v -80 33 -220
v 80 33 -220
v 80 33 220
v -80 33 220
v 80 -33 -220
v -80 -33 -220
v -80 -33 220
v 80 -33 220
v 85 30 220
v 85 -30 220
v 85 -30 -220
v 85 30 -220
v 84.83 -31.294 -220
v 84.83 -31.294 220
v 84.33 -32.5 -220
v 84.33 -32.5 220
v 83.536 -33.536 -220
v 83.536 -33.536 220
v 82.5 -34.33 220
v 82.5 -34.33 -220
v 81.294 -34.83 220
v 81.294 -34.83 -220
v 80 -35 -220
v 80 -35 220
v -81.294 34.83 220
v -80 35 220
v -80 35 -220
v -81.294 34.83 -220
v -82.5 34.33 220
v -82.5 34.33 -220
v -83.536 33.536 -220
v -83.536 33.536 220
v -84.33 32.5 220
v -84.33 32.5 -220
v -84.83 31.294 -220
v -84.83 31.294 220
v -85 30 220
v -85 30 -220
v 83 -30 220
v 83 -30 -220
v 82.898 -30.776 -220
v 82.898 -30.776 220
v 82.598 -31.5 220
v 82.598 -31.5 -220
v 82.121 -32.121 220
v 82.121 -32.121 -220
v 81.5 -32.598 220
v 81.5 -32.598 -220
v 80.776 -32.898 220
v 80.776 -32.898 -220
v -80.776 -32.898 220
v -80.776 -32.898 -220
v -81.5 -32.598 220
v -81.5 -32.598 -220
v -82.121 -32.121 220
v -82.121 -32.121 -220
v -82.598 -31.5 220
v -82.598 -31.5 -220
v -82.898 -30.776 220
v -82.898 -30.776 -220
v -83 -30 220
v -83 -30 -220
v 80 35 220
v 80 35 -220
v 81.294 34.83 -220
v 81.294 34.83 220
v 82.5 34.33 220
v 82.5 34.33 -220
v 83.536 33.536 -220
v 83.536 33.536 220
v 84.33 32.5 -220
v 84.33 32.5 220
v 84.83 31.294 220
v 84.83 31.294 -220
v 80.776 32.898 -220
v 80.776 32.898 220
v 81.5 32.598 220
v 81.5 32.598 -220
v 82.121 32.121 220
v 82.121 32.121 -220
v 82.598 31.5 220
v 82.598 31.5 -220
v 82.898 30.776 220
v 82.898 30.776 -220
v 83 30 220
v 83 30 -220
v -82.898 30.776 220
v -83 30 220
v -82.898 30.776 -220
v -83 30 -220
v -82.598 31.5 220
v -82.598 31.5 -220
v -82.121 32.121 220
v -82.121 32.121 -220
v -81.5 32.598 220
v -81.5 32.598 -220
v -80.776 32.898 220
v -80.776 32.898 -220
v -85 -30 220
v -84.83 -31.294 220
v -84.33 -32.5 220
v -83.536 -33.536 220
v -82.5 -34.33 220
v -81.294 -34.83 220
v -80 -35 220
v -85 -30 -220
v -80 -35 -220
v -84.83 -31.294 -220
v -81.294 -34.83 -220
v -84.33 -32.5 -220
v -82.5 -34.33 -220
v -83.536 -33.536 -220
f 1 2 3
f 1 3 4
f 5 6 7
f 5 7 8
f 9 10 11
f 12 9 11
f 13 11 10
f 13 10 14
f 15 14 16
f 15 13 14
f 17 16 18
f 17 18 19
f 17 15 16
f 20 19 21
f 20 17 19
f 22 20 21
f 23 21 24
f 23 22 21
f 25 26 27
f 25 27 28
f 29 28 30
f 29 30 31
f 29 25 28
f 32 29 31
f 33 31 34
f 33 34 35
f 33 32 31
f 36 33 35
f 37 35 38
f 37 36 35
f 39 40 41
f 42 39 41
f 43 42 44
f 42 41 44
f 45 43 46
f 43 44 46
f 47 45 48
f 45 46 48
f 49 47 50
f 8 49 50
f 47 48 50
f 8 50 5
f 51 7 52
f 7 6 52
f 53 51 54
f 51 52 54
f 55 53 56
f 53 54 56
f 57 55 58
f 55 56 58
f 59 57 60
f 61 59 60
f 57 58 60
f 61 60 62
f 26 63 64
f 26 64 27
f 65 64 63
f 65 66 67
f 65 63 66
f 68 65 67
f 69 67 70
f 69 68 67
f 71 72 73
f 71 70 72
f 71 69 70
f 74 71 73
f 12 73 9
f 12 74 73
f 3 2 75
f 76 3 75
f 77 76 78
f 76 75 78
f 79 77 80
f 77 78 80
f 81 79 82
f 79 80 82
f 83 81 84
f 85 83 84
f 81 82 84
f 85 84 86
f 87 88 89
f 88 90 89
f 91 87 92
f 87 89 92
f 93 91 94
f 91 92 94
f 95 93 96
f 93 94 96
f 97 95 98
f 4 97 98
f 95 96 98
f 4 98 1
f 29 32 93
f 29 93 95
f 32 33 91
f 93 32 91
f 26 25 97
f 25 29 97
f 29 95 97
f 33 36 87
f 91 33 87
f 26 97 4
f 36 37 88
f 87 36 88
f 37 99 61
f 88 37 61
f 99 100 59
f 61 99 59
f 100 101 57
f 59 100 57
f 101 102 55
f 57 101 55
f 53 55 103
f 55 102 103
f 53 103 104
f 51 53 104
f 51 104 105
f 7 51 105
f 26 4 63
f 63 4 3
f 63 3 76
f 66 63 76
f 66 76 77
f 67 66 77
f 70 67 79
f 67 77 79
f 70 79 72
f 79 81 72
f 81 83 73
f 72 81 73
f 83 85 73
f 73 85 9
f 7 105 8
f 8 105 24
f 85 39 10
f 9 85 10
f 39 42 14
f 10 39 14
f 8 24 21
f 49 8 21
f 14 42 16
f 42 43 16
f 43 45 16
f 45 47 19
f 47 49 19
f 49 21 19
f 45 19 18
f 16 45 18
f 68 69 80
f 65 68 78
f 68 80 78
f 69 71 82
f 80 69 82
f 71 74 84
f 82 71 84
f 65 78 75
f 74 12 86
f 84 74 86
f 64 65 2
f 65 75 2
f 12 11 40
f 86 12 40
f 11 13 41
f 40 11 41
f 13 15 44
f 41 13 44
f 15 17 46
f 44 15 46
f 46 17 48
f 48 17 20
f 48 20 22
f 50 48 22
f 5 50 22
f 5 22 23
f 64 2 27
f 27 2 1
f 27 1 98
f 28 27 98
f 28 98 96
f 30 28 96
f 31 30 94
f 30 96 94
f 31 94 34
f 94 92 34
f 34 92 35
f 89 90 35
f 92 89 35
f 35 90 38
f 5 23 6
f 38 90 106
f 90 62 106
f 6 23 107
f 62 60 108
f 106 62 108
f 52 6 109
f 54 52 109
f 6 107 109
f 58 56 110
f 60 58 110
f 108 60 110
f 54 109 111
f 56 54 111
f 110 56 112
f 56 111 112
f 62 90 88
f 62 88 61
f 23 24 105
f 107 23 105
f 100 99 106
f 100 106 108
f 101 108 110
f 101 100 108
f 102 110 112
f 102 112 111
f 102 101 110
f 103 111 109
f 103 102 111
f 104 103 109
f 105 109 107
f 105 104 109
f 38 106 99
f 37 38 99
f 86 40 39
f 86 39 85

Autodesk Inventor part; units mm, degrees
ref_plane "YZ Plane" through (0, 0, 0) normal (1, 0, 0) x (0, 1, 0)
ref_plane "XZ Plane" through (0, 0, 0) normal (0, 1, 0) x (-1, 0, 0)
ref_plane "XY Plane" through (0, 0, 0) normal (0, 0, 1) x (1, 0, 0)
sketch "Esquisse1" plane through (0, 0, 0) normal (0, 1, 0) x (-1, 0, 0)
  line L0 (0, -308) -> (0, 308) construction
  line L1 (-119, 0) -> (119, 0) construction
  line L2 (-85, -220) -> (85, -220)
  line L3 (85, -220) -> (85, 220)
  line L4 (85, 220) -> (-85, 220)
  line L5 (-85, 220) -> (-85, -220)
  line L6 (-85, -220) -> (85, 220) construction
  line L7 (85, -220) -> (-85, 220) construction
  point P0 (0, 0)
  dimension "d0" = 170
  dimension "d1" = 440
extrude "Extrusion1" add sketch "Esquisse1" along normal mid plane 70
fillet "Congé1" radius 5 4 edges at (85, -35, 0) (85, 35, 0) (-85, -35, 0) (-85, 35, 0)
sketch "Sketch2" plane through (80, 35, -220) normal (0, 0, -1) x (-1, 0, 0)
  arc A0 (165, -5) -> (160, 0) centre (160, -5) ccw construction
  line L0 (0, 0) -> (160, 0) construction
  arc A1 (0, 0) -> (-5, -5) centre (0, -5) ccw construction
  line L1 (-5, -5) -> (-5, -65) construction
  arc A2 (-5, -65) -> (0, -70) centre (0, -65) ccw construction
  line L2 (160, -70) -> (0, -70) construction
  arc A3 (160, -70) -> (165, -65) centre (160, -65) ccw construction
  line L3 (165, -65) -> (165, -5) construction
  arc A4 (-3, -65) -> (0, -68) centre (0, -65) ccw
  line L4 (-3, -65) -> (-3, -5)
  arc A5 (0, -2) -> (-3, -5) centre (0, -5) ccw
  line L5 (0, -2) -> (160, -2)
  arc A6 (163, -5) -> (160, -2) centre (160, -5) ccw
  line L6 (163, -5) -> (163, -65)
  arc A7 (160, -68) -> (163, -65) centre (160, -65) ccw
  line L7 (160, -68) -> (0, -68)
  point P0 (80, -35)
  dimension "d5" = 2
extrude "Extrusion2" cut sketch "Sketch2" against normal through all
properties part number "Casing_Generator"
